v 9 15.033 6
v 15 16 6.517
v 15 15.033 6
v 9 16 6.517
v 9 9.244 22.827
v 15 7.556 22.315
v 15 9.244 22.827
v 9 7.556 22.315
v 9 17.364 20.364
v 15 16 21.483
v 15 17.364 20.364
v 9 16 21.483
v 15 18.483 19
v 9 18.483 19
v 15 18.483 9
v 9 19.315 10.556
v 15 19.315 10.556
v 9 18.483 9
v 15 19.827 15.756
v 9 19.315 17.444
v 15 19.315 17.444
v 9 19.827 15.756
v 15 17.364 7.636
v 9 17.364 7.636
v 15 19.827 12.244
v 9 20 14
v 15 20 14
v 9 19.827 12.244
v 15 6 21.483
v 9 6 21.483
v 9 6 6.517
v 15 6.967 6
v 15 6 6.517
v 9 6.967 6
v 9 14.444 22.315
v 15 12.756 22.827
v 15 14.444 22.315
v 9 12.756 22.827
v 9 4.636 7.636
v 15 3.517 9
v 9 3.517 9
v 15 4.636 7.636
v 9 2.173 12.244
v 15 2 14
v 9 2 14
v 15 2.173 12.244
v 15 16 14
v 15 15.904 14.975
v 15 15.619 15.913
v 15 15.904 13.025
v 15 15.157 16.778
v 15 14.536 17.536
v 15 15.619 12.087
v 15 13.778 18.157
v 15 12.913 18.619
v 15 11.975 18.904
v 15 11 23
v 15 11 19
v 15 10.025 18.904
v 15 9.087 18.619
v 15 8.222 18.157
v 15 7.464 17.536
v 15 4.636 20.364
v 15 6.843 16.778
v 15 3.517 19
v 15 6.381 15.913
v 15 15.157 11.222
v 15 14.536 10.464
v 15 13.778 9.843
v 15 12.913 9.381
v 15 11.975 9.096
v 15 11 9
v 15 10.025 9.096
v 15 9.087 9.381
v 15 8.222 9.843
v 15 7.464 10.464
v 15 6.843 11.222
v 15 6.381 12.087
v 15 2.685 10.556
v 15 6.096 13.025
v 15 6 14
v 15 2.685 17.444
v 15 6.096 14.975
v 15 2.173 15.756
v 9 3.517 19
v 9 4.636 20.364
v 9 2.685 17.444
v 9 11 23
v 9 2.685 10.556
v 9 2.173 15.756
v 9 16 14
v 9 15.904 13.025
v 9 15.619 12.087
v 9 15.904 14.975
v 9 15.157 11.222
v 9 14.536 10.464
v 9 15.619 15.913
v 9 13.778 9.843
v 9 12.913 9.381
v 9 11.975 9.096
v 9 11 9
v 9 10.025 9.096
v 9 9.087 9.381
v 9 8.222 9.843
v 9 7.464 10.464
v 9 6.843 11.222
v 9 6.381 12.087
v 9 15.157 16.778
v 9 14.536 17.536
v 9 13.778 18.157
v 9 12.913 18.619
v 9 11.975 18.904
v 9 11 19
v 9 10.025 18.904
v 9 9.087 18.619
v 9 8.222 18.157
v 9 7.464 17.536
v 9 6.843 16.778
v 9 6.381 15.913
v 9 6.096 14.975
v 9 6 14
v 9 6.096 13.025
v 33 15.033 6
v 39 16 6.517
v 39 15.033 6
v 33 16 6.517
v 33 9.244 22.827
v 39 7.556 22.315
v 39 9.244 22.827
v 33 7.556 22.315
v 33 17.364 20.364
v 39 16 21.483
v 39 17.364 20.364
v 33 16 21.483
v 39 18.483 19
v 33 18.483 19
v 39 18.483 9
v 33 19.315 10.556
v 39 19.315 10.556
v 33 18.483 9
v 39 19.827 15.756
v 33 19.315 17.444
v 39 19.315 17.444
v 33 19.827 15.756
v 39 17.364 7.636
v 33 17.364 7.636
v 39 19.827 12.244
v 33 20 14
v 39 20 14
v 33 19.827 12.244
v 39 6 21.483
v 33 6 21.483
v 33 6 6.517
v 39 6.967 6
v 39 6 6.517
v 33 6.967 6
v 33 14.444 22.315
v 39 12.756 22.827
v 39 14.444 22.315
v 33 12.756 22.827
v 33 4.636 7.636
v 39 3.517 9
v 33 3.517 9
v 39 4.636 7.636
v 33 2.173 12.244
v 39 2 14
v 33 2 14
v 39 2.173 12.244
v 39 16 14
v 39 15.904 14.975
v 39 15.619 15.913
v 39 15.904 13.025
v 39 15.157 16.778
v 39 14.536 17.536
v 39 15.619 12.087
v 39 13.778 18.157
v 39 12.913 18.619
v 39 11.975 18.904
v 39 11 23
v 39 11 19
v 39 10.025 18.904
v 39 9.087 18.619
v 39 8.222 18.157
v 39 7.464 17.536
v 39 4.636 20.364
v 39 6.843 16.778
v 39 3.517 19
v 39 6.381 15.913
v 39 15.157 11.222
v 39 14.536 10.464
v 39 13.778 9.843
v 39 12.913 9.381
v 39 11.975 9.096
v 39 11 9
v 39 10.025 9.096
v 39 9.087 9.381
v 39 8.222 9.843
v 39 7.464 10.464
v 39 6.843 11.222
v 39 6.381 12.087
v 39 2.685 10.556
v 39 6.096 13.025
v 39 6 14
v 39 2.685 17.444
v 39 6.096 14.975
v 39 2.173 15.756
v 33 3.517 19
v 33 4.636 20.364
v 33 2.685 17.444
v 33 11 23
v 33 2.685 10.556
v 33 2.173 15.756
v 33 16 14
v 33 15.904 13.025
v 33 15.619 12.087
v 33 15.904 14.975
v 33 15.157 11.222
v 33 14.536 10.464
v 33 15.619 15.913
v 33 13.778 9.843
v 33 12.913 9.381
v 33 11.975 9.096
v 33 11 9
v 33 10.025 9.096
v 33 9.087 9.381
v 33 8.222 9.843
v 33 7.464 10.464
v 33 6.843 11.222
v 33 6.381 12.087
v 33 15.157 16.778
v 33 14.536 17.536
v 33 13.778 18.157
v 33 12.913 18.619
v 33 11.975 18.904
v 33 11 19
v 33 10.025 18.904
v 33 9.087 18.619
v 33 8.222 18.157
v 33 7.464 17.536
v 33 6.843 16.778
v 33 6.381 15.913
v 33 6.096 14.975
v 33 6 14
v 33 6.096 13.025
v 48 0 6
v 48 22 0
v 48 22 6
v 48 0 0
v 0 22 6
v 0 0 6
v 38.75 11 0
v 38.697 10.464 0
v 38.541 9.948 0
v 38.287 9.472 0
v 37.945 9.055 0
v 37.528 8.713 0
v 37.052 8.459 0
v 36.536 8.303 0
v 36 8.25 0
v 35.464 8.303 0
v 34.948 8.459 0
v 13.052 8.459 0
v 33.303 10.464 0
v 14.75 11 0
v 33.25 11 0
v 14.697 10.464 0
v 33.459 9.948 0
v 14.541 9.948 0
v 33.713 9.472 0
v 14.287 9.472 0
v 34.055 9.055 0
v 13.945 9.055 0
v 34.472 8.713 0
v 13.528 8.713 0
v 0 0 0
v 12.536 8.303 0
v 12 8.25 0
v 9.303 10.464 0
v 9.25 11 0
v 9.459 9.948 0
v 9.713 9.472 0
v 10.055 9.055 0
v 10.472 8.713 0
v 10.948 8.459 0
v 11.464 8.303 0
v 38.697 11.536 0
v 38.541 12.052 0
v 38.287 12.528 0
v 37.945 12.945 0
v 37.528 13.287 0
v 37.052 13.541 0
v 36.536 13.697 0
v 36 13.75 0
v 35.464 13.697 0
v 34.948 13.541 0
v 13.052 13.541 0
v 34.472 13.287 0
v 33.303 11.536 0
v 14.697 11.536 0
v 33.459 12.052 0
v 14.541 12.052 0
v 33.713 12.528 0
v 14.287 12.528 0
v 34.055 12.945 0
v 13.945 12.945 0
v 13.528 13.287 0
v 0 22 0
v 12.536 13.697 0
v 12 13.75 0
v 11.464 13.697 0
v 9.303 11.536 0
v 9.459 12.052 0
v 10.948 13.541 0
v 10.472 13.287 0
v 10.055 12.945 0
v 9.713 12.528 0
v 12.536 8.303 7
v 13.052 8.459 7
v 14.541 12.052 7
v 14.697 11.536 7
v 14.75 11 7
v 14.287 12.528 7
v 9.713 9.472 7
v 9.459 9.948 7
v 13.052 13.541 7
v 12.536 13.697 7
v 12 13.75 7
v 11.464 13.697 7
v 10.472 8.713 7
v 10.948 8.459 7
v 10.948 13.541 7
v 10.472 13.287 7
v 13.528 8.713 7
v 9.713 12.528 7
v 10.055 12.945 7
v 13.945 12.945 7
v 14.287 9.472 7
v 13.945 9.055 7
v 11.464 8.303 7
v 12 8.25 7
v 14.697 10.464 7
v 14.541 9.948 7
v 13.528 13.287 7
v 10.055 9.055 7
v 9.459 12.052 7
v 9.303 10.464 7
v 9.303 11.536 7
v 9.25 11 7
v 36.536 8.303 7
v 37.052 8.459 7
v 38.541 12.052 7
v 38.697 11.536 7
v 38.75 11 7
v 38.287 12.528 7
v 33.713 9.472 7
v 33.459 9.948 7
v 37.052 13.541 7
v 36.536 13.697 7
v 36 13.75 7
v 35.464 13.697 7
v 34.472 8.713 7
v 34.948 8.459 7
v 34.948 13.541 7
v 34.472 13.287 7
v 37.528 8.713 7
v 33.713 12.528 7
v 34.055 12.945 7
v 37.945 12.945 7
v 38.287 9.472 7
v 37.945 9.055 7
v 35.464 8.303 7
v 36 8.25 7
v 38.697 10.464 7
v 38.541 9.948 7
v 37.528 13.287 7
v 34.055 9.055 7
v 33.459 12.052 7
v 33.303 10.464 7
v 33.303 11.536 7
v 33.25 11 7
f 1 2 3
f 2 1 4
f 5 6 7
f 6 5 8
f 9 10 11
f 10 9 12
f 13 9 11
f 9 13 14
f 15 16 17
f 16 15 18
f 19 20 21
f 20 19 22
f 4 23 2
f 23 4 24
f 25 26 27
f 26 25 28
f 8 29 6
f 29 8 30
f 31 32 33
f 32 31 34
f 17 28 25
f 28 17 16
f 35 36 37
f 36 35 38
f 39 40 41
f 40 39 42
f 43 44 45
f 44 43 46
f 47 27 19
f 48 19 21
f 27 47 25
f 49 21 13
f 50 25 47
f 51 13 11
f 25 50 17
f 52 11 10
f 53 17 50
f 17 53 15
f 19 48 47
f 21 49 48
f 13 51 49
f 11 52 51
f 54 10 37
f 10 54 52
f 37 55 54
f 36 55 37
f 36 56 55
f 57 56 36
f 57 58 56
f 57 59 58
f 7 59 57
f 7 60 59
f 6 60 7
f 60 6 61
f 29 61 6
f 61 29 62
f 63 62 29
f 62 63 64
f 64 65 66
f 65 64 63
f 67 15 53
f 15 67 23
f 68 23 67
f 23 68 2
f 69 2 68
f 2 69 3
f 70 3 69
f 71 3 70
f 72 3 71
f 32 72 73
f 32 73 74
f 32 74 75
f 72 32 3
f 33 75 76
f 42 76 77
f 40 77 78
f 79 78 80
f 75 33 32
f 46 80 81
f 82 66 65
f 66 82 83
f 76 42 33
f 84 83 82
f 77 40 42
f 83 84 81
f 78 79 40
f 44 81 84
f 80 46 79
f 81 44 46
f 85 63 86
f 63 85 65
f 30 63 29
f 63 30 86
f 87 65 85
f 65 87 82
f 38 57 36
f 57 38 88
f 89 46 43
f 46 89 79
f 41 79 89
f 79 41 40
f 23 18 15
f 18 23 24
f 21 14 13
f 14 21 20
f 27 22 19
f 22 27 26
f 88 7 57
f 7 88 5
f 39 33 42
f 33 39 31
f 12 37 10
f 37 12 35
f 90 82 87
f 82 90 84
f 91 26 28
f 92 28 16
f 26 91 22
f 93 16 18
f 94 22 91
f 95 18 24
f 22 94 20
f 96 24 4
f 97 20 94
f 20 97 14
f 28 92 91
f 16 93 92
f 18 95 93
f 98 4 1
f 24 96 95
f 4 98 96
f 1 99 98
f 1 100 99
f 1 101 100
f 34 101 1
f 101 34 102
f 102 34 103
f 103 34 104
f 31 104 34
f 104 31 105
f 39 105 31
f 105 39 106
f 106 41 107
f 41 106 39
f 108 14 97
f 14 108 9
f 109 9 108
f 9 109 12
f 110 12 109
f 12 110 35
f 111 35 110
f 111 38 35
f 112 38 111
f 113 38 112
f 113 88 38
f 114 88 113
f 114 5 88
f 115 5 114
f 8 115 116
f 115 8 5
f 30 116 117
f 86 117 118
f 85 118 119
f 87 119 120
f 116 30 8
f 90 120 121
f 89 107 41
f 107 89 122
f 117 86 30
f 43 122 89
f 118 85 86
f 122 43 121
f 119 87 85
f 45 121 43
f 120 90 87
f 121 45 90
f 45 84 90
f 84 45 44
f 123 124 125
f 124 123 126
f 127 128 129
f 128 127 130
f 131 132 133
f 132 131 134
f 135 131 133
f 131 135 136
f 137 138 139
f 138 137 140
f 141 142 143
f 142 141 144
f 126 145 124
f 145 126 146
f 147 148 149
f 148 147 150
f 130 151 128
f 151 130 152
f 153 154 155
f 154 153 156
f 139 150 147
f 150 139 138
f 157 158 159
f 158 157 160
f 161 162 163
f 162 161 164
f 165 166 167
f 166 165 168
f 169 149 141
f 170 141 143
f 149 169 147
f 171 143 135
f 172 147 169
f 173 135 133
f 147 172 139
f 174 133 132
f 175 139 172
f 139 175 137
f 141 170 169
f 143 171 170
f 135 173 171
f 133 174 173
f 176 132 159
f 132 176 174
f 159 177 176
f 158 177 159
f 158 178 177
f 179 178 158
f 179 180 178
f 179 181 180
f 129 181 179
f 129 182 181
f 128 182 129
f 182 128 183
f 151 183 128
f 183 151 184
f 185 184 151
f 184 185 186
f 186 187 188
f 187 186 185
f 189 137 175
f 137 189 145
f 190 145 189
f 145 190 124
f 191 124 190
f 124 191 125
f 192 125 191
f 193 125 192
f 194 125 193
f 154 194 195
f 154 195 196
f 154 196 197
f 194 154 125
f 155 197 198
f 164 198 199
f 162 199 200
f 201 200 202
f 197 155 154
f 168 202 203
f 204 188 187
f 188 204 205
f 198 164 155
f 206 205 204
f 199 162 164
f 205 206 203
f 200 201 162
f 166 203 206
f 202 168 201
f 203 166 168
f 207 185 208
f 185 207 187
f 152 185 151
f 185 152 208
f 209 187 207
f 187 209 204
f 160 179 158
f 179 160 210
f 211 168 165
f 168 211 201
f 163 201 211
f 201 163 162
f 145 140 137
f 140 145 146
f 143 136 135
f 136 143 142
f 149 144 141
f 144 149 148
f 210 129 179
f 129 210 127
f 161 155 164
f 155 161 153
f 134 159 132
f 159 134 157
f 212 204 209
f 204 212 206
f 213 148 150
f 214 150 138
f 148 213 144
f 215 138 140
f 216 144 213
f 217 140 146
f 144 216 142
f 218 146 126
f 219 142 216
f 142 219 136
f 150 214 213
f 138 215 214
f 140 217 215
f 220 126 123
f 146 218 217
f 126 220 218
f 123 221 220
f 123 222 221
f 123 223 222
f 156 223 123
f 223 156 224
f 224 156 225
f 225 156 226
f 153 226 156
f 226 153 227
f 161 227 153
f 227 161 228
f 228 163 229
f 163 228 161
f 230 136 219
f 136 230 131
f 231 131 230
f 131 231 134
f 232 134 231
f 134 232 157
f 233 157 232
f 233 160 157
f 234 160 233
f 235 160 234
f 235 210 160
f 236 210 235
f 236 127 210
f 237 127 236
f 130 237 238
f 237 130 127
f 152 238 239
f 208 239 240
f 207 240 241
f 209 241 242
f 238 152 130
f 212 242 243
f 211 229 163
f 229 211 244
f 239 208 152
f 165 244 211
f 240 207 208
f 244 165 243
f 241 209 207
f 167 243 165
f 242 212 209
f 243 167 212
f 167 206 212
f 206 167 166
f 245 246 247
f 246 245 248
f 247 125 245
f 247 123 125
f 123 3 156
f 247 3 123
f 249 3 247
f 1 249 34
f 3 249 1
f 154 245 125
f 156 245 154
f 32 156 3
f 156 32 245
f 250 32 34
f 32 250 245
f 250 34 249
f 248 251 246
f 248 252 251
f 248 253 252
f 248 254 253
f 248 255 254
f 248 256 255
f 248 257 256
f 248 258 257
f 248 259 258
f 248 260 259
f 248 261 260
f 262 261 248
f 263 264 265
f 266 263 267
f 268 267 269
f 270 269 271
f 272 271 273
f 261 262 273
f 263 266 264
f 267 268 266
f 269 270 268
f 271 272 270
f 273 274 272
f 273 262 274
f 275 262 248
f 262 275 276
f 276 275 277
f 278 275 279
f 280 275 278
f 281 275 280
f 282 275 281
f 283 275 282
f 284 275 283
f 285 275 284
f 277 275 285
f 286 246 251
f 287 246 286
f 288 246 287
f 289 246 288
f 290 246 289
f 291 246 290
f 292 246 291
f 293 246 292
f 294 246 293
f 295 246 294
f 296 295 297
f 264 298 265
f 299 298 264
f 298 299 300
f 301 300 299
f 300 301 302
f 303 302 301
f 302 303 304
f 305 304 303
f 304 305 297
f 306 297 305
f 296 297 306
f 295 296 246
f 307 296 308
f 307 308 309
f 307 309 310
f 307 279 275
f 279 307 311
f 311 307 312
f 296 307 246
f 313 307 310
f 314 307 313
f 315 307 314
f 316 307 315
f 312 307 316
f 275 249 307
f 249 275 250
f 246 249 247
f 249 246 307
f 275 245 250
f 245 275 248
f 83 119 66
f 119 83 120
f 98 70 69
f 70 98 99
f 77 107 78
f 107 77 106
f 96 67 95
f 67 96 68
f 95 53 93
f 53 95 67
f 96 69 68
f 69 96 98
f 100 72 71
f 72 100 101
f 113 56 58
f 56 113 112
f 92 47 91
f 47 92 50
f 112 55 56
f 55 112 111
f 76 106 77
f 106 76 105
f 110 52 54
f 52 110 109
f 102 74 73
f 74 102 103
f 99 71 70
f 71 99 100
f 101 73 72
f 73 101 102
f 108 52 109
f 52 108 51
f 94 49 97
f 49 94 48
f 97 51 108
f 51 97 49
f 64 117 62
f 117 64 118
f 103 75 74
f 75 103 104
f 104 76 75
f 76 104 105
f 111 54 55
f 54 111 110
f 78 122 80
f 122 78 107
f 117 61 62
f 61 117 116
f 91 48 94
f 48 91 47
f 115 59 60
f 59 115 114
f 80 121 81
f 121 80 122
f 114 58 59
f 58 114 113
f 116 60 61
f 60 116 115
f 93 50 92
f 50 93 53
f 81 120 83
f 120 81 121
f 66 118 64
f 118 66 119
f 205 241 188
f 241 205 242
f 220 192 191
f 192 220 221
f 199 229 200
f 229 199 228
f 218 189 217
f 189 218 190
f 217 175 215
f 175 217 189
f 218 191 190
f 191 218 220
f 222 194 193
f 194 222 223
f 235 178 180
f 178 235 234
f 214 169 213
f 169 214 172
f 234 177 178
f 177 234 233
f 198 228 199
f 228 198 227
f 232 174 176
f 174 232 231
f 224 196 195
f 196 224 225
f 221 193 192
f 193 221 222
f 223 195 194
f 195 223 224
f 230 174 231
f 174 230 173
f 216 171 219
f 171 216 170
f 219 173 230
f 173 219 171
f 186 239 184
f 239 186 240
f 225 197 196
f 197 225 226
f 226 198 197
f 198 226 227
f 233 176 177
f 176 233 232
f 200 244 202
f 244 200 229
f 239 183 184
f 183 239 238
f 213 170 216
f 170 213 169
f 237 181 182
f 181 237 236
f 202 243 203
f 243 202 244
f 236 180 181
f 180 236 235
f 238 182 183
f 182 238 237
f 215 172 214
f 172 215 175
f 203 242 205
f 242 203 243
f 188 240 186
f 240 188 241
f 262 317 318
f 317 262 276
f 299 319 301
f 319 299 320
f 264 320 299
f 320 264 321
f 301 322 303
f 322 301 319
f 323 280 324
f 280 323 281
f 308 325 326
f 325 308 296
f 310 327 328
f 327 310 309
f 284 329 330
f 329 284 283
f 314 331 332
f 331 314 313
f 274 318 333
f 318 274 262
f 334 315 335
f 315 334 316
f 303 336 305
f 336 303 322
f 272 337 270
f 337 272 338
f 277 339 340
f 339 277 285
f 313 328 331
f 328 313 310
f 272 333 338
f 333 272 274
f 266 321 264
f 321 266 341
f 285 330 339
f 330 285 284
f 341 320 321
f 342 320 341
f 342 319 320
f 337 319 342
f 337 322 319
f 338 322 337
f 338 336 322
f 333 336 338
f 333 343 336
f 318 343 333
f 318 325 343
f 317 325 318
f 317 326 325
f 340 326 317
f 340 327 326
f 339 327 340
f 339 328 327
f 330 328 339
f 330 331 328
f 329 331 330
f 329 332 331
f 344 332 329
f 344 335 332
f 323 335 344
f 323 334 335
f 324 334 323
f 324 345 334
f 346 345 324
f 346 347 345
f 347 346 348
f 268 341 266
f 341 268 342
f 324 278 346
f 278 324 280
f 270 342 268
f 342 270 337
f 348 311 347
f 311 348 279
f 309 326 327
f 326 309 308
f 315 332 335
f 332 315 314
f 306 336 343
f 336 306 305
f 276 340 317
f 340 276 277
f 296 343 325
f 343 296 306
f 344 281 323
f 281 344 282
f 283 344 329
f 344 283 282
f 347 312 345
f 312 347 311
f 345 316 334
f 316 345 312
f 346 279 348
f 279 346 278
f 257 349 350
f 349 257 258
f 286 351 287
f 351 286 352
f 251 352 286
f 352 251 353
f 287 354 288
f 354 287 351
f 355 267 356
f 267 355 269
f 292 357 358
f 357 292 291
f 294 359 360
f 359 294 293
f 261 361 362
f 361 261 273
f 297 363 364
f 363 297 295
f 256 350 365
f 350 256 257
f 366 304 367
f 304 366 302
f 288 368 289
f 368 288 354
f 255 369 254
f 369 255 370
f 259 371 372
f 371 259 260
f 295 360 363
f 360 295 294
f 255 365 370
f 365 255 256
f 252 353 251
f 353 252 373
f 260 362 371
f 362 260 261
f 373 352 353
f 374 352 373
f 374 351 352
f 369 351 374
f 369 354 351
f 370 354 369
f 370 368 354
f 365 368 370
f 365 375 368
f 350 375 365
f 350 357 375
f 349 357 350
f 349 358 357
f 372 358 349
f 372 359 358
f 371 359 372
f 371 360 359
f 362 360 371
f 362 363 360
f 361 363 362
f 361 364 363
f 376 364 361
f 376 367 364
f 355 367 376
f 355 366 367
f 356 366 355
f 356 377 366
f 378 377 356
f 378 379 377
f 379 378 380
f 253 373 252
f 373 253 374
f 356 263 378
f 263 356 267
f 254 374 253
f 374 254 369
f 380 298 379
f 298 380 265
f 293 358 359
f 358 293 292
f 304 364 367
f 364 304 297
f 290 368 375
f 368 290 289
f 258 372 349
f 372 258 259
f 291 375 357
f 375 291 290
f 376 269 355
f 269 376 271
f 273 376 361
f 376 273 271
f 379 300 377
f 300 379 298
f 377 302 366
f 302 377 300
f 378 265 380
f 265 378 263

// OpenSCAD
$fn = 32;

// ----------------------------------------------------------------------
// Cable clip: cable 10 mm, clamp 18 mm, base 48 mm
// ----------------------------------------------------------------------

// --- parameters (mm) ---
plate_x = 48;             // base length, X
plate_y = 22;             // base width, Y
plate_t = 6;              // base thickness
wire_seat_d = 18;         // clamp outside diameter
clip_t = 4;               // clamp wall
cable_d = 10;             // cable opening
ring_w = 6;               // clamp width along the cable
screw_d = 5.5;            // screw clearance
sink = 1;                 // overlap of the clamp into the base
pitch = 24;               // distance between the two clamps

module base() {
  cube([plate_x, plate_y, plate_t]);
}

module clamps() {
  for (sx = [-1, 1])
    translate([plate_x / 2 + sx * pitch / 2, plate_y / 2, plate_t + wire_seat_d / 2 - sink]) rotate([0, 90, 0])
      cylinder(h = ring_w, d = wire_seat_d, center = true);
}

difference() {
  union() {
    base();
    clamps();
  }
  for (sx = [-1, 1])
    translate([plate_x / 2 + sx * pitch / 2, plate_y / 2, plate_t + wire_seat_d / 2 - sink]) rotate([0, 90, 0]) translate([0, 0, -ring_w / 2 - 1]) cylinder(h = ring_w + 2, d = cable_d);
  translate([12, plate_y / 2, -1]) cylinder(h = plate_t + 2, d = screw_d);
  translate([36, plate_y / 2, -1]) cylinder(h = plate_t + 2, d = screw_d);
}
